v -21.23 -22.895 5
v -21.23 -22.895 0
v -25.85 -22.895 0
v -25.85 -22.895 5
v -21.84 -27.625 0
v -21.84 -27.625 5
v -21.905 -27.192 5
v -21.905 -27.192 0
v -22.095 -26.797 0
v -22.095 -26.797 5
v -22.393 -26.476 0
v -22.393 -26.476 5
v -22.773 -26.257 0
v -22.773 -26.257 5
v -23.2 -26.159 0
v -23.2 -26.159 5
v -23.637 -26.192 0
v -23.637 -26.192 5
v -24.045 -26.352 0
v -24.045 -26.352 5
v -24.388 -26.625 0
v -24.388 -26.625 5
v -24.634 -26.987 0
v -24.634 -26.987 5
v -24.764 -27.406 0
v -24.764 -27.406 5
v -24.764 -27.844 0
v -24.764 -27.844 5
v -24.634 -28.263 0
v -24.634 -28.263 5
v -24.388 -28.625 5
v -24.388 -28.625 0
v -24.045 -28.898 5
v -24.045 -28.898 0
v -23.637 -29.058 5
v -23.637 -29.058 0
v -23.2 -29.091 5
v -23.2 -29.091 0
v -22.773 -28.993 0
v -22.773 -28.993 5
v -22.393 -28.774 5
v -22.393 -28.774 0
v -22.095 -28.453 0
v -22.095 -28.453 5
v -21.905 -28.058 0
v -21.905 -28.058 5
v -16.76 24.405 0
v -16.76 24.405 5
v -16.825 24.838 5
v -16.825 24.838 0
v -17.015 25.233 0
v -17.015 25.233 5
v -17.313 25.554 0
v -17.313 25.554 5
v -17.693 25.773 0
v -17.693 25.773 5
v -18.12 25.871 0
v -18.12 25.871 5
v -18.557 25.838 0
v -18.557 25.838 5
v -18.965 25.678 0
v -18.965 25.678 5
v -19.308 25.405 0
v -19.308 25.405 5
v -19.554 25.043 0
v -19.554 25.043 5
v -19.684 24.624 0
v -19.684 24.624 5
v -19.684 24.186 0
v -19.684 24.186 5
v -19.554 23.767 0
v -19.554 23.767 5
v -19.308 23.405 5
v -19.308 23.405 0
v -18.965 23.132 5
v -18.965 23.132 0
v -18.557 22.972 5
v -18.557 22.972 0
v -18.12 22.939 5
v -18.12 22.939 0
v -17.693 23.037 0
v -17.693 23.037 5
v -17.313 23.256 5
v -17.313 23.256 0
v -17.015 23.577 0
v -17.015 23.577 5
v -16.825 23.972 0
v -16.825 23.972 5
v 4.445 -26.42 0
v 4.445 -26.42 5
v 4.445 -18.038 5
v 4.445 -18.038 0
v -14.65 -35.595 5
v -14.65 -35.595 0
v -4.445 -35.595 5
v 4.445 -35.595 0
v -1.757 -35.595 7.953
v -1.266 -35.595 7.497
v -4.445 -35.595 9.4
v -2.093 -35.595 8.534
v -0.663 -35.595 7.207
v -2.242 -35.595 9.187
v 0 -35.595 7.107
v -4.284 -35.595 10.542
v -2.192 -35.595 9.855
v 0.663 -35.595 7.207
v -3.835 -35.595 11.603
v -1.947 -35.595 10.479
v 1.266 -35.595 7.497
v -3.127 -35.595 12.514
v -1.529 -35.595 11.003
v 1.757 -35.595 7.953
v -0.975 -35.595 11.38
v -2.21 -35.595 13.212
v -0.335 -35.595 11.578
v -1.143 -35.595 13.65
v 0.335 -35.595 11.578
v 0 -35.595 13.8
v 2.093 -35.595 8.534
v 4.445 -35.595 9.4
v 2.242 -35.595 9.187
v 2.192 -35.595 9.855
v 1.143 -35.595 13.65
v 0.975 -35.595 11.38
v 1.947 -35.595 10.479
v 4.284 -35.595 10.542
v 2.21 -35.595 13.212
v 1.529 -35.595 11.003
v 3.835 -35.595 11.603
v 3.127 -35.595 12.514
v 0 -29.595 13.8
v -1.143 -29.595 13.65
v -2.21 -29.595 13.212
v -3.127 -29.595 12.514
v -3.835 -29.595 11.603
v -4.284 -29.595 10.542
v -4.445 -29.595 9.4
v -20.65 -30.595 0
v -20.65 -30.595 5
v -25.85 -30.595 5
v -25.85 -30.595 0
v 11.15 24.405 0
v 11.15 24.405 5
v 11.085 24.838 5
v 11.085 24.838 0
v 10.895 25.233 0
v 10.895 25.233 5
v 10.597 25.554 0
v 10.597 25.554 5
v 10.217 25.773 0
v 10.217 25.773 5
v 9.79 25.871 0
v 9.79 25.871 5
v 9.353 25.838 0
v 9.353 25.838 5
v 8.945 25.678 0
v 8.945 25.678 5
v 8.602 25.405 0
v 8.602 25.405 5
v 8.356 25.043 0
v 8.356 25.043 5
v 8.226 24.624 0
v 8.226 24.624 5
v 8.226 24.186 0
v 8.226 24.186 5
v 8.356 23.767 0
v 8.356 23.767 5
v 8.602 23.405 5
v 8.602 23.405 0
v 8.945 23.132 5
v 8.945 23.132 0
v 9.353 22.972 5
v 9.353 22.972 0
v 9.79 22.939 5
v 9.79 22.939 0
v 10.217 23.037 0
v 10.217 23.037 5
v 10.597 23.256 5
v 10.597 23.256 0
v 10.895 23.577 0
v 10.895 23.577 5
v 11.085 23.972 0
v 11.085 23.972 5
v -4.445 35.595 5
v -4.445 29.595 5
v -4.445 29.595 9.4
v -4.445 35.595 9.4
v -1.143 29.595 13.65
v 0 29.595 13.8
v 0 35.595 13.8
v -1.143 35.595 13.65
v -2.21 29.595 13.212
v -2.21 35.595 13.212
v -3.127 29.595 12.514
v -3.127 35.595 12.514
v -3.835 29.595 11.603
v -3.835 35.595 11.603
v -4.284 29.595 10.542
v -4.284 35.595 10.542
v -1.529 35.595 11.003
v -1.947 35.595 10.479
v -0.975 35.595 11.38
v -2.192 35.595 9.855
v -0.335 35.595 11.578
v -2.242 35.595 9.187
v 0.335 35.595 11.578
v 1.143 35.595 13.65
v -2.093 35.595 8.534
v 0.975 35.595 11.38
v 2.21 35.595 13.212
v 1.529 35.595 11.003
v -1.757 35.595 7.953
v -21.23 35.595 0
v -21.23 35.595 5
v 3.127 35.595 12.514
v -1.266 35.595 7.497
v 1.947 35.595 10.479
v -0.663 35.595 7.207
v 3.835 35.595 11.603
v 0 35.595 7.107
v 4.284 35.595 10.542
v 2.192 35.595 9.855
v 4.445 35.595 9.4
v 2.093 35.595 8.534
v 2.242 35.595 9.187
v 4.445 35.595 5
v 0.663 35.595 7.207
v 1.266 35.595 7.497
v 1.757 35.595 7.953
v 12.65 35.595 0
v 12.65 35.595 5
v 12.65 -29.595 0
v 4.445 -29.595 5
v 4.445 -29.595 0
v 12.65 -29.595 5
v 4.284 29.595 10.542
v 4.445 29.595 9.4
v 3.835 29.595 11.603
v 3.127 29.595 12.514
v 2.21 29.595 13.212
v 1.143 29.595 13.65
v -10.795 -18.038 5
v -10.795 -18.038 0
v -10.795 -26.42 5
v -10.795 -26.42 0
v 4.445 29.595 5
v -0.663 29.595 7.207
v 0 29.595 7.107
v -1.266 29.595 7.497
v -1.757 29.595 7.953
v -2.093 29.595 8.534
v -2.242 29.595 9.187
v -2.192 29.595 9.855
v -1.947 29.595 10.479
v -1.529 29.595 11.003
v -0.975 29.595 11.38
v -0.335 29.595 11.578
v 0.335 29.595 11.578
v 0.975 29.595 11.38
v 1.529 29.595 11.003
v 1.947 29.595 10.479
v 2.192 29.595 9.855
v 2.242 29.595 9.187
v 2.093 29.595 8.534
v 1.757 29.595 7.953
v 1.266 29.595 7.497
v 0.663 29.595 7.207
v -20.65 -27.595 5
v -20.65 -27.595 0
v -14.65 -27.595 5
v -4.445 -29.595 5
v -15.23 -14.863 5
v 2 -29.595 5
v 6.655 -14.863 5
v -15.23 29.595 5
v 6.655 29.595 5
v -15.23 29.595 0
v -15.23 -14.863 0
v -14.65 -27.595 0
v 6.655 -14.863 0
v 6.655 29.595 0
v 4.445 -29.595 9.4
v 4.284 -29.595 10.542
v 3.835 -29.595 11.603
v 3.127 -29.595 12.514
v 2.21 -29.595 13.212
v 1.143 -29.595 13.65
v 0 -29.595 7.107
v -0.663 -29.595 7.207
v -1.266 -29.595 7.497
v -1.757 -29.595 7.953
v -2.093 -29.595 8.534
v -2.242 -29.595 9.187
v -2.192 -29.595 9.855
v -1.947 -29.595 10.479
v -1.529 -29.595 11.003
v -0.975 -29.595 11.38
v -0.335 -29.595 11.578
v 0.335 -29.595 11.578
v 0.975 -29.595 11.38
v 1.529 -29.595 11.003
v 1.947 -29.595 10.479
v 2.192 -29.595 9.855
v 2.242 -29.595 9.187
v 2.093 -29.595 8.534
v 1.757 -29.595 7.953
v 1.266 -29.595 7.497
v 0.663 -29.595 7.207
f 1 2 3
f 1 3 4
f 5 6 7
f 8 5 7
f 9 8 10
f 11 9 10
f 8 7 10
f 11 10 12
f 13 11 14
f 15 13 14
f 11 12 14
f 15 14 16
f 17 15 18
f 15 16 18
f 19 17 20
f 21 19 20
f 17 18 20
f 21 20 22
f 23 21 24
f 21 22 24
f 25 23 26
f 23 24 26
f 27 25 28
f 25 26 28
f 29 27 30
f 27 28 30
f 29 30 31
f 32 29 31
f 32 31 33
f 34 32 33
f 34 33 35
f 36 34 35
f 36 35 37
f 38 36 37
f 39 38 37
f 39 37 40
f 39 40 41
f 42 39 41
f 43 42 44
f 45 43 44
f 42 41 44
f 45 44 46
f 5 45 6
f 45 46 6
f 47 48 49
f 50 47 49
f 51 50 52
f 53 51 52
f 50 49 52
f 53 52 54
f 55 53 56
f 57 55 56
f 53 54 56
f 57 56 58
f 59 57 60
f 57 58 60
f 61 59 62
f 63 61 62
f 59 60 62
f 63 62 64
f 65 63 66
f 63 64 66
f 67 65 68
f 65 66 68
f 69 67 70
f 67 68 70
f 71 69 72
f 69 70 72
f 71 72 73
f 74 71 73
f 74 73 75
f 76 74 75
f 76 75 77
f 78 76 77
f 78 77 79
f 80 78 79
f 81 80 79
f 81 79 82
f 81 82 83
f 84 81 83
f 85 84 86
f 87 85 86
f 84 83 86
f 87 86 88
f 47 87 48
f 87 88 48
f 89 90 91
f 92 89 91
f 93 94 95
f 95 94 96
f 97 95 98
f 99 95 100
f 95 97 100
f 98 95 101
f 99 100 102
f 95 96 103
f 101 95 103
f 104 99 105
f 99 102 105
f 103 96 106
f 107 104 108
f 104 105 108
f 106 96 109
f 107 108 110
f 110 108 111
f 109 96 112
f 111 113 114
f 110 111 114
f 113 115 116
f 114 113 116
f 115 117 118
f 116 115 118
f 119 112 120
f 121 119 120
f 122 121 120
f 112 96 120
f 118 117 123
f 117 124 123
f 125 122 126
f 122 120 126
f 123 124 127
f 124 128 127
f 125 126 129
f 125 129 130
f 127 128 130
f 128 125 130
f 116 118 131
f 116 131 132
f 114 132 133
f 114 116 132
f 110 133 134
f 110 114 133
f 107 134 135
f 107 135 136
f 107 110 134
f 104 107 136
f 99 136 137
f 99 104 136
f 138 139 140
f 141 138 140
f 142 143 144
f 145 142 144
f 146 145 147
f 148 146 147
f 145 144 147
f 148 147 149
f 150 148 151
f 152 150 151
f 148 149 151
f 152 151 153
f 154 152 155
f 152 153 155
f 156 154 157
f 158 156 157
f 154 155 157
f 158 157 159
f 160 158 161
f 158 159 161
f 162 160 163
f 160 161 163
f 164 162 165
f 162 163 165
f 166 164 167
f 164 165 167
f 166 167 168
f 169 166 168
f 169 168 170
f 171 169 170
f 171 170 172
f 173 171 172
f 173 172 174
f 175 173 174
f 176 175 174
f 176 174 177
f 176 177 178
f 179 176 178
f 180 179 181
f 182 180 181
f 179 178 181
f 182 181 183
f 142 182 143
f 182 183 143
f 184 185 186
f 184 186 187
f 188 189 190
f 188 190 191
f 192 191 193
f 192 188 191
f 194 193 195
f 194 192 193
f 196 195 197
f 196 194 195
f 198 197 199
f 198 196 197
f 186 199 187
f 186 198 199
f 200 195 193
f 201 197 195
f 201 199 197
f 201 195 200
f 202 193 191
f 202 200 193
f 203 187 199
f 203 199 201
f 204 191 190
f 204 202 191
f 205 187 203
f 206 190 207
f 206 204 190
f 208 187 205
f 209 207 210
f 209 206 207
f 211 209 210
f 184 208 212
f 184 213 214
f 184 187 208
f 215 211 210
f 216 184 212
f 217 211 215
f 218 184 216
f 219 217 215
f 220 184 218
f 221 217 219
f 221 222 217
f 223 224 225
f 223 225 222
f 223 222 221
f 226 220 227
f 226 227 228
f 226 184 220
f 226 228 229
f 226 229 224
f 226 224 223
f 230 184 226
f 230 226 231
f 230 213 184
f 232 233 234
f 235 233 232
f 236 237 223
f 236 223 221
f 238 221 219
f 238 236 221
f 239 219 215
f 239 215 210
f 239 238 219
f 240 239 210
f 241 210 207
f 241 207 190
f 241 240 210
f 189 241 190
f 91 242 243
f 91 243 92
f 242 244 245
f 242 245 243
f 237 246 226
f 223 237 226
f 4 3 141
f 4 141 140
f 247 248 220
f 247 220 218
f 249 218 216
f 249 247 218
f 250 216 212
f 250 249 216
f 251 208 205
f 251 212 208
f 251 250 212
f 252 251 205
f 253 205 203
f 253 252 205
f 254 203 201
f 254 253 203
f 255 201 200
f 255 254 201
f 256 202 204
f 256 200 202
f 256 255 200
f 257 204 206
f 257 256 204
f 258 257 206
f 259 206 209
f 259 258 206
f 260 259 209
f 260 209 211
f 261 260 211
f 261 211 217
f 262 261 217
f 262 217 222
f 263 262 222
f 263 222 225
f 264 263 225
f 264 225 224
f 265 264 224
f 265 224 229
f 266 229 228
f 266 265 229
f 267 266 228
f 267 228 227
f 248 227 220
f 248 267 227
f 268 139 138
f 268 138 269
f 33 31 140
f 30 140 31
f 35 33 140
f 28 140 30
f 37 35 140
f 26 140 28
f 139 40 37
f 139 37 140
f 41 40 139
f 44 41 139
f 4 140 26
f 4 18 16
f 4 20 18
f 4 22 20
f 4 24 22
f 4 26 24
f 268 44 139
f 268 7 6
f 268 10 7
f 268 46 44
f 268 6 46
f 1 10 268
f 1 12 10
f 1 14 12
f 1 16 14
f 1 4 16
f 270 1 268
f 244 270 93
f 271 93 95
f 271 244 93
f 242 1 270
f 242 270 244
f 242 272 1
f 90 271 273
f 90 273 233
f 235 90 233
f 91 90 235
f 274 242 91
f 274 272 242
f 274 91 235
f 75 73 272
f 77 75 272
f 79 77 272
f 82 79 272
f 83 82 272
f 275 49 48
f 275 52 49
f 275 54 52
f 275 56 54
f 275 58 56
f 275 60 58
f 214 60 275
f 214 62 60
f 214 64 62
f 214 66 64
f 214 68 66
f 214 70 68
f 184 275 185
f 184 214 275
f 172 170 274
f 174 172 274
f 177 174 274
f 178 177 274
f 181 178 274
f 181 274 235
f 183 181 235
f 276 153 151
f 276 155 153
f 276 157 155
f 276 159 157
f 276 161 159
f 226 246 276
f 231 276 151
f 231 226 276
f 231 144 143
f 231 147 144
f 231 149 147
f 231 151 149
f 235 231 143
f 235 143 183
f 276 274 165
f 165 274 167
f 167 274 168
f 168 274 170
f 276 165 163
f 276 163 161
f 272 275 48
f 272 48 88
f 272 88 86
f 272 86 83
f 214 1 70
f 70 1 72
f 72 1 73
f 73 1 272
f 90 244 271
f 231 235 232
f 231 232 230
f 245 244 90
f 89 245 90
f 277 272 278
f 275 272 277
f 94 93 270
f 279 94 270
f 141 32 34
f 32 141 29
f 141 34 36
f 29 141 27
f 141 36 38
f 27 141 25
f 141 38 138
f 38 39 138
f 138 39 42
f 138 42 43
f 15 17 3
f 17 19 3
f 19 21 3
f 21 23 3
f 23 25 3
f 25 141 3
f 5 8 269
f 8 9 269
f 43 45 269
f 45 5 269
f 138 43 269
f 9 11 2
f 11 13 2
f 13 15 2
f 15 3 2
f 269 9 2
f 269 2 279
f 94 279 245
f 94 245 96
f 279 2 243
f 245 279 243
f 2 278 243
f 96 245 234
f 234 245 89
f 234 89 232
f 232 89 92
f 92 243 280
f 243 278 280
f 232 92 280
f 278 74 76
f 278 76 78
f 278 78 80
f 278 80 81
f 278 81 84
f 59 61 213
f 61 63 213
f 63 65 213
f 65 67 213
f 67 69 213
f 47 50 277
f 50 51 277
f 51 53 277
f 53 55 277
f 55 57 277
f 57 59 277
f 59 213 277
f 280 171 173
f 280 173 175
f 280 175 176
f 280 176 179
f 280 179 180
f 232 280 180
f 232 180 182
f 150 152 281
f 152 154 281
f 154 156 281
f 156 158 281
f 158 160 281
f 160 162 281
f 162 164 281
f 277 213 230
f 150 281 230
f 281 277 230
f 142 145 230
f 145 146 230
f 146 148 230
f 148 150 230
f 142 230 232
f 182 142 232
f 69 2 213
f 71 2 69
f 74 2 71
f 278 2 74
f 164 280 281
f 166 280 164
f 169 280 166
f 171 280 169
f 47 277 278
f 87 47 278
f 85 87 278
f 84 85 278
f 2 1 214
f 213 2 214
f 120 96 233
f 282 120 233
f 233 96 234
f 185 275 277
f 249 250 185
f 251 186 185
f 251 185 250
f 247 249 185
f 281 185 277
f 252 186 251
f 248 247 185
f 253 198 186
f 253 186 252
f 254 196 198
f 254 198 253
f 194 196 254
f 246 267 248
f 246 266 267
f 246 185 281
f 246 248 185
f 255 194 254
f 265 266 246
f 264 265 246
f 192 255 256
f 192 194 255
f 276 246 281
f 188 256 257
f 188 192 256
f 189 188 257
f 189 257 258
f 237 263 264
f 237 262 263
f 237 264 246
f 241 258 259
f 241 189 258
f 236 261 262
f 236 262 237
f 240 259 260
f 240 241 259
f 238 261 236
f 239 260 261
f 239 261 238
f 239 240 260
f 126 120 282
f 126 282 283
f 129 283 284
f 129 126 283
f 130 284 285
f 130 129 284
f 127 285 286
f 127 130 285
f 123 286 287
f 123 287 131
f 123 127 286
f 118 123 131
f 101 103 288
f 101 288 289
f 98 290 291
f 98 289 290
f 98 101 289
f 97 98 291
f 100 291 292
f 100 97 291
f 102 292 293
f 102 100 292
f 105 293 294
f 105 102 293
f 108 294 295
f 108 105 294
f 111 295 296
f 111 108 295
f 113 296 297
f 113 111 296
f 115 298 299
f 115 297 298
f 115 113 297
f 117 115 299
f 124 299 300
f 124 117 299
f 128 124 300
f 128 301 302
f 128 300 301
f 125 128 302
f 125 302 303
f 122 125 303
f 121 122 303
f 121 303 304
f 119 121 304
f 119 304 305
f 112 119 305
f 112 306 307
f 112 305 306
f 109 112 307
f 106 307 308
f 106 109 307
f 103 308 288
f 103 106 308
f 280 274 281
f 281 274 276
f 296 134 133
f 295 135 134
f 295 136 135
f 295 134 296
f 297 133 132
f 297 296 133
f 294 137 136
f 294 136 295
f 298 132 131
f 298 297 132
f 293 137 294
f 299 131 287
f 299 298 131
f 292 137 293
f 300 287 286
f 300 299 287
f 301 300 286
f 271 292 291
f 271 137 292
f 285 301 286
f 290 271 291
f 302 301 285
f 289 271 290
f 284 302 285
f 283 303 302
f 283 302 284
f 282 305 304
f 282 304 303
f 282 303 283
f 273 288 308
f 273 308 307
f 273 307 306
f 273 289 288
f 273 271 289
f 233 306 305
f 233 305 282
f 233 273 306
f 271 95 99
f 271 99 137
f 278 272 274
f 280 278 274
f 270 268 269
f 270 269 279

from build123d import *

# Parameters (mm, degrees)
SKETCH2_W               = 43.3
SKETCH2_H               = 71.19
SKETCH2_W_2             = 31.3
SKETCH2_H_2             = 59.19
BOSS_EXTRUDE1_DEPTH     = 5
SKETCH3_W               = 8.89
SKETCH3_H               = 6
BOSS_EXTRUDE2_DEPTH     = 8.8
CUT_EXTRUDE1_DEPTH      = 76.678124977
CUT_EXTRUDE1_DEPTH_BACK = 76.678124977
SKETCH5_R               = 2.2479
SKETCH8_W               = 11.205
SKETCH8_H               = 59.19
BOSS_EXTRUDE4_DEPTH     = 5
SKETCH9_W               = 9
SKETCH9_H               = 71.19
SKETCH9_W_2             = 2.21
SKETCH9_H_2             = 59.19
CUT_EXTRUDE2_DEPTH      = 5
SKETCH10_W              = 0.42
SKETCH10_H              = 59.19
BOSS_EXTRUDE5_DEPTH     = 5
SKETCH11_W              = 0.42
SKETCH11_H              = 71.19
CUT_EXTRUDE3_DEPTH      = 5
SKETCH12_W              = 6.655
SKETCH12_H              = 10.668
BOSS_EXTRUDE6_DEPTH     = 5
SKETCH13_W              = 8.205
SKETCH13_H              = 6
CUT_EXTRUDE4_DEPTH      = 5
SKETCH14_W              = 2
SKETCH14_H              = 10.668
CUT_EXTRUDE5_DEPTH      = 5
SKETCH15_W              = 5
SKETCH15_H              = 12.7
BOSS_EXTRUDE7_DEPTH     = 4.62
SKETCH16_W              = 10.785
SKETCH16_H              = 10.668
BOSS_EXTRUDE8_DEPTH     = 5
SKETCH17_W              = 6
SKETCH17_H              = 3
CUT_EXTRUDE6_DEPTH      = 5
SKETCH18_R              = 1.47
CUT_EXTRUDE7_DEPTH      = 5
SKETCH23_R              = 1.47
CUT_EXTRUDE10_DEPTH     = 5
SKETCH25_W              = 6.445
SKETCH25_H              = 2.583619091
BOSS_EXTRUDE12_DEPTH    = 5
SKETCH26_W              = 15.24
SKETCH26_H              = 8.382
SKETCH26_W_2            = 19.675
SKETCH26_H_2            = 6.066644496
SKETCH26_W_3            = 2.21
CUT_EXTRUDE11_DEPTH     = 5


with BuildPart() as part:
    # Sketch2 → Boss-Extrude1 (new body)
    with BuildSketch(Plane.XY):
        Rectangle(SKETCH2_W, SKETCH2_H)
        Rectangle(SKETCH2_W_2, SKETCH2_H_2, mode=Mode.SUBTRACT)
    extrude(amount=BOSS_EXTRUDE1_DEPTH)

    # Sketch3 → Boss-Extrude2 (add)
    with BuildSketch(Plane.XY.offset(5)):
        with Locations((0, 32.595)):
            Rectangle(SKETCH3_W, SKETCH3_H)
        with Locations((0, -32.595)):
            Rectangle(SKETCH3_W, SKETCH3_H)
    extrude(amount=BOSS_EXTRUDE2_DEPTH)

    # Sketch5 → Cut-Extrude1 (cut, two sides: drawn at the far end of the back side and taken through both)
    with BuildSketch(Plane(origin=(0, 35.595, 0), x_dir=(1, 0, 0), z_dir=(0, 1, 0)).offset(-CUT_EXTRUDE1_DEPTH_BACK)):
        with BuildLine():
            Line((-4.445, -13.8), (-2.8e-08, -13.8))
            ThreePointArc((-2.8e-08, -13.8), (-3.127220221, -12.513973022), (-4.445, -9.4))
            Line((-4.445, -9.4), (-4.445, -13.8))
        make_face()
        with BuildLine():
            Line((4.445, -13.8), (4.445, -9.4))
            ThreePointArc((4.445, -9.4), (3.127220202, -12.513973041), (-2.8e-08, -13.8))
            Line((-2.8e-08, -13.8), (4.445, -13.8))
        make_face()
        with Locations(Location((0, -9.354769886, 0), (0, 0, 90))):
            Circle(SKETCH5_R)
    extrude(amount=CUT_EXTRUDE1_DEPTH + CUT_EXTRUDE1_DEPTH_BACK, mode=Mode.SUBTRACT)

    # Sketch8 → Boss-Extrude4 (add)
    with BuildSketch(Plane.XY.offset(5)):
        with Locations((10.0475, 0)):
            Rectangle(SKETCH8_W, SKETCH8_H)
    extrude(amount=-BOSS_EXTRUDE4_DEPTH)

    # Sketch9 → Cut-Extrude2 (cut)
    with BuildSketch(Plane.XY.offset(5)):
        with Locations((17.15, 0)):
            Rectangle(SKETCH9_W, SKETCH9_H)
        with Locations((5.55, 0)):
            Rectangle(SKETCH9_W_2, SKETCH9_H_2)
    extrude(amount=-CUT_EXTRUDE2_DEPTH, mode=Mode.SUBTRACT)

    # Sketch10 → Boss-Extrude5 (add)
    with BuildSketch(Plane.XY.offset(5)):
        with Locations((-15.44, 0)):
            Rectangle(SKETCH10_W, SKETCH10_H)
    extrude(amount=-BOSS_EXTRUDE5_DEPTH)

    # Sketch11 → Cut-Extrude3 (cut)
    with BuildSketch(Plane.XY.offset(5)):
        with Locations((-21.44, 0)):
            Rectangle(SKETCH11_W, SKETCH11_H)
    extrude(amount=-CUT_EXTRUDE3_DEPTH, mode=Mode.SUBTRACT)

    # Sketch12 → Boss-Extrude6 (add)
    with BuildSketch(Plane.XY.offset(5)):
        with Locations((3.3275, -24.261)):
            Rectangle(SKETCH12_W, SKETCH12_H)
    extrude(amount=-BOSS_EXTRUDE6_DEPTH)

    # Sketch13 → Cut-Extrude4 (cut)
    with BuildSketch(Plane.XY.offset(5)):
        with Locations((8.5475, -32.595)):
            Rectangle(SKETCH13_W, SKETCH13_H)
    extrude(amount=-CUT_EXTRUDE4_DEPTH, mode=Mode.SUBTRACT)

    # Sketch14 → Cut-Extrude5 (cut)
    with BuildSketch(Plane.XY.offset(5)):
        with Locations((1, -24.261)):
            Rectangle(SKETCH14_W, SKETCH14_H)
    extrude(amount=-CUT_EXTRUDE5_DEPTH, mode=Mode.SUBTRACT)

    # Sketch15 → Boss-Extrude7 (add)
    with BuildSketch(Plane.ZY.offset(21.23)):
        with Locations((2.5, -29.245)):
            Rectangle(SKETCH15_W, SKETCH15_H)
    extrude(amount=BOSS_EXTRUDE7_DEPTH)

    # Sketch16 → Boss-Extrude8 (add)
    with BuildSketch(Plane.XY.offset(5)):
        with Locations((-9.8375, -24.261)):
            Rectangle(SKETCH16_W, SKETCH16_H)
    extrude(amount=-BOSS_EXTRUDE8_DEPTH)

    # Sketch17 → Cut-Extrude6 (cut)
    with BuildSketch(Plane.XY.offset(5)):
        with Locations((-17.65, -29.095)):
            Rectangle(SKETCH17_W, SKETCH17_H)
        Polygon((-25.85, -30.595), (-25.85, -35.595), (-14.65, -35.595), (-14.65, -30.595), (-20.65, -30.595), align=None)
    extrude(amount=-CUT_EXTRUDE6_DEPTH, mode=Mode.SUBTRACT)

    # Sketch18 → Cut-Extrude7 (cut)
    with BuildSketch(Plane.XY.offset(5)):
        with Locations((-23.31, -27.625)):
            Circle(SKETCH18_R)
    extrude(amount=-CUT_EXTRUDE7_DEPTH, mode=Mode.SUBTRACT)

    # Sketch23 → Cut-Extrude10 (cut)
    with BuildSketch(Plane.XY.offset(5)):
        with Locations((-18.23, 24.405)):
            Circle(SKETCH23_R)
        with Locations((9.68, 24.405)):
            Circle(SKETCH23_R)
    extrude(amount=-CUT_EXTRUDE10_DEPTH, mode=Mode.SUBTRACT)

    # Sketch25 → Boss-Extrude12 (add)
    with BuildSketch(Plane.XY.offset(5)):
        Polygon((6.655, -27.011380909), (6.655, -8.796355504), (-15.23, -8.796355504), (-15.23, -18.927), (-4.445, -18.927), (-4.445, -27.011380909), (2, -27.011380909), align=None)
        with Locations((-1.2225, -28.303190455)):
            Rectangle(SKETCH25_W, SKETCH25_H)
    extrude(amount=-BOSS_EXTRUDE12_DEPTH)

    # Sketch26 → Cut-Extrude11 (cut)
    with BuildSketch(Plane.XY.offset(5)):
        with Locations((-3.175, -22.229)):
            Rectangle(SKETCH26_W, SKETCH26_H)
        with Locations((-5.3925, -11.829677752)):
            Rectangle(SKETCH26_W_2, SKETCH26_H_2)
        with Locations((5.55, -11.829677752)):
            Rectangle(SKETCH26_W_3, SKETCH26_H_2)
    extrude(amount=-CUT_EXTRUDE11_DEPTH, mode=Mode.SUBTRACT)


solid = part.part
